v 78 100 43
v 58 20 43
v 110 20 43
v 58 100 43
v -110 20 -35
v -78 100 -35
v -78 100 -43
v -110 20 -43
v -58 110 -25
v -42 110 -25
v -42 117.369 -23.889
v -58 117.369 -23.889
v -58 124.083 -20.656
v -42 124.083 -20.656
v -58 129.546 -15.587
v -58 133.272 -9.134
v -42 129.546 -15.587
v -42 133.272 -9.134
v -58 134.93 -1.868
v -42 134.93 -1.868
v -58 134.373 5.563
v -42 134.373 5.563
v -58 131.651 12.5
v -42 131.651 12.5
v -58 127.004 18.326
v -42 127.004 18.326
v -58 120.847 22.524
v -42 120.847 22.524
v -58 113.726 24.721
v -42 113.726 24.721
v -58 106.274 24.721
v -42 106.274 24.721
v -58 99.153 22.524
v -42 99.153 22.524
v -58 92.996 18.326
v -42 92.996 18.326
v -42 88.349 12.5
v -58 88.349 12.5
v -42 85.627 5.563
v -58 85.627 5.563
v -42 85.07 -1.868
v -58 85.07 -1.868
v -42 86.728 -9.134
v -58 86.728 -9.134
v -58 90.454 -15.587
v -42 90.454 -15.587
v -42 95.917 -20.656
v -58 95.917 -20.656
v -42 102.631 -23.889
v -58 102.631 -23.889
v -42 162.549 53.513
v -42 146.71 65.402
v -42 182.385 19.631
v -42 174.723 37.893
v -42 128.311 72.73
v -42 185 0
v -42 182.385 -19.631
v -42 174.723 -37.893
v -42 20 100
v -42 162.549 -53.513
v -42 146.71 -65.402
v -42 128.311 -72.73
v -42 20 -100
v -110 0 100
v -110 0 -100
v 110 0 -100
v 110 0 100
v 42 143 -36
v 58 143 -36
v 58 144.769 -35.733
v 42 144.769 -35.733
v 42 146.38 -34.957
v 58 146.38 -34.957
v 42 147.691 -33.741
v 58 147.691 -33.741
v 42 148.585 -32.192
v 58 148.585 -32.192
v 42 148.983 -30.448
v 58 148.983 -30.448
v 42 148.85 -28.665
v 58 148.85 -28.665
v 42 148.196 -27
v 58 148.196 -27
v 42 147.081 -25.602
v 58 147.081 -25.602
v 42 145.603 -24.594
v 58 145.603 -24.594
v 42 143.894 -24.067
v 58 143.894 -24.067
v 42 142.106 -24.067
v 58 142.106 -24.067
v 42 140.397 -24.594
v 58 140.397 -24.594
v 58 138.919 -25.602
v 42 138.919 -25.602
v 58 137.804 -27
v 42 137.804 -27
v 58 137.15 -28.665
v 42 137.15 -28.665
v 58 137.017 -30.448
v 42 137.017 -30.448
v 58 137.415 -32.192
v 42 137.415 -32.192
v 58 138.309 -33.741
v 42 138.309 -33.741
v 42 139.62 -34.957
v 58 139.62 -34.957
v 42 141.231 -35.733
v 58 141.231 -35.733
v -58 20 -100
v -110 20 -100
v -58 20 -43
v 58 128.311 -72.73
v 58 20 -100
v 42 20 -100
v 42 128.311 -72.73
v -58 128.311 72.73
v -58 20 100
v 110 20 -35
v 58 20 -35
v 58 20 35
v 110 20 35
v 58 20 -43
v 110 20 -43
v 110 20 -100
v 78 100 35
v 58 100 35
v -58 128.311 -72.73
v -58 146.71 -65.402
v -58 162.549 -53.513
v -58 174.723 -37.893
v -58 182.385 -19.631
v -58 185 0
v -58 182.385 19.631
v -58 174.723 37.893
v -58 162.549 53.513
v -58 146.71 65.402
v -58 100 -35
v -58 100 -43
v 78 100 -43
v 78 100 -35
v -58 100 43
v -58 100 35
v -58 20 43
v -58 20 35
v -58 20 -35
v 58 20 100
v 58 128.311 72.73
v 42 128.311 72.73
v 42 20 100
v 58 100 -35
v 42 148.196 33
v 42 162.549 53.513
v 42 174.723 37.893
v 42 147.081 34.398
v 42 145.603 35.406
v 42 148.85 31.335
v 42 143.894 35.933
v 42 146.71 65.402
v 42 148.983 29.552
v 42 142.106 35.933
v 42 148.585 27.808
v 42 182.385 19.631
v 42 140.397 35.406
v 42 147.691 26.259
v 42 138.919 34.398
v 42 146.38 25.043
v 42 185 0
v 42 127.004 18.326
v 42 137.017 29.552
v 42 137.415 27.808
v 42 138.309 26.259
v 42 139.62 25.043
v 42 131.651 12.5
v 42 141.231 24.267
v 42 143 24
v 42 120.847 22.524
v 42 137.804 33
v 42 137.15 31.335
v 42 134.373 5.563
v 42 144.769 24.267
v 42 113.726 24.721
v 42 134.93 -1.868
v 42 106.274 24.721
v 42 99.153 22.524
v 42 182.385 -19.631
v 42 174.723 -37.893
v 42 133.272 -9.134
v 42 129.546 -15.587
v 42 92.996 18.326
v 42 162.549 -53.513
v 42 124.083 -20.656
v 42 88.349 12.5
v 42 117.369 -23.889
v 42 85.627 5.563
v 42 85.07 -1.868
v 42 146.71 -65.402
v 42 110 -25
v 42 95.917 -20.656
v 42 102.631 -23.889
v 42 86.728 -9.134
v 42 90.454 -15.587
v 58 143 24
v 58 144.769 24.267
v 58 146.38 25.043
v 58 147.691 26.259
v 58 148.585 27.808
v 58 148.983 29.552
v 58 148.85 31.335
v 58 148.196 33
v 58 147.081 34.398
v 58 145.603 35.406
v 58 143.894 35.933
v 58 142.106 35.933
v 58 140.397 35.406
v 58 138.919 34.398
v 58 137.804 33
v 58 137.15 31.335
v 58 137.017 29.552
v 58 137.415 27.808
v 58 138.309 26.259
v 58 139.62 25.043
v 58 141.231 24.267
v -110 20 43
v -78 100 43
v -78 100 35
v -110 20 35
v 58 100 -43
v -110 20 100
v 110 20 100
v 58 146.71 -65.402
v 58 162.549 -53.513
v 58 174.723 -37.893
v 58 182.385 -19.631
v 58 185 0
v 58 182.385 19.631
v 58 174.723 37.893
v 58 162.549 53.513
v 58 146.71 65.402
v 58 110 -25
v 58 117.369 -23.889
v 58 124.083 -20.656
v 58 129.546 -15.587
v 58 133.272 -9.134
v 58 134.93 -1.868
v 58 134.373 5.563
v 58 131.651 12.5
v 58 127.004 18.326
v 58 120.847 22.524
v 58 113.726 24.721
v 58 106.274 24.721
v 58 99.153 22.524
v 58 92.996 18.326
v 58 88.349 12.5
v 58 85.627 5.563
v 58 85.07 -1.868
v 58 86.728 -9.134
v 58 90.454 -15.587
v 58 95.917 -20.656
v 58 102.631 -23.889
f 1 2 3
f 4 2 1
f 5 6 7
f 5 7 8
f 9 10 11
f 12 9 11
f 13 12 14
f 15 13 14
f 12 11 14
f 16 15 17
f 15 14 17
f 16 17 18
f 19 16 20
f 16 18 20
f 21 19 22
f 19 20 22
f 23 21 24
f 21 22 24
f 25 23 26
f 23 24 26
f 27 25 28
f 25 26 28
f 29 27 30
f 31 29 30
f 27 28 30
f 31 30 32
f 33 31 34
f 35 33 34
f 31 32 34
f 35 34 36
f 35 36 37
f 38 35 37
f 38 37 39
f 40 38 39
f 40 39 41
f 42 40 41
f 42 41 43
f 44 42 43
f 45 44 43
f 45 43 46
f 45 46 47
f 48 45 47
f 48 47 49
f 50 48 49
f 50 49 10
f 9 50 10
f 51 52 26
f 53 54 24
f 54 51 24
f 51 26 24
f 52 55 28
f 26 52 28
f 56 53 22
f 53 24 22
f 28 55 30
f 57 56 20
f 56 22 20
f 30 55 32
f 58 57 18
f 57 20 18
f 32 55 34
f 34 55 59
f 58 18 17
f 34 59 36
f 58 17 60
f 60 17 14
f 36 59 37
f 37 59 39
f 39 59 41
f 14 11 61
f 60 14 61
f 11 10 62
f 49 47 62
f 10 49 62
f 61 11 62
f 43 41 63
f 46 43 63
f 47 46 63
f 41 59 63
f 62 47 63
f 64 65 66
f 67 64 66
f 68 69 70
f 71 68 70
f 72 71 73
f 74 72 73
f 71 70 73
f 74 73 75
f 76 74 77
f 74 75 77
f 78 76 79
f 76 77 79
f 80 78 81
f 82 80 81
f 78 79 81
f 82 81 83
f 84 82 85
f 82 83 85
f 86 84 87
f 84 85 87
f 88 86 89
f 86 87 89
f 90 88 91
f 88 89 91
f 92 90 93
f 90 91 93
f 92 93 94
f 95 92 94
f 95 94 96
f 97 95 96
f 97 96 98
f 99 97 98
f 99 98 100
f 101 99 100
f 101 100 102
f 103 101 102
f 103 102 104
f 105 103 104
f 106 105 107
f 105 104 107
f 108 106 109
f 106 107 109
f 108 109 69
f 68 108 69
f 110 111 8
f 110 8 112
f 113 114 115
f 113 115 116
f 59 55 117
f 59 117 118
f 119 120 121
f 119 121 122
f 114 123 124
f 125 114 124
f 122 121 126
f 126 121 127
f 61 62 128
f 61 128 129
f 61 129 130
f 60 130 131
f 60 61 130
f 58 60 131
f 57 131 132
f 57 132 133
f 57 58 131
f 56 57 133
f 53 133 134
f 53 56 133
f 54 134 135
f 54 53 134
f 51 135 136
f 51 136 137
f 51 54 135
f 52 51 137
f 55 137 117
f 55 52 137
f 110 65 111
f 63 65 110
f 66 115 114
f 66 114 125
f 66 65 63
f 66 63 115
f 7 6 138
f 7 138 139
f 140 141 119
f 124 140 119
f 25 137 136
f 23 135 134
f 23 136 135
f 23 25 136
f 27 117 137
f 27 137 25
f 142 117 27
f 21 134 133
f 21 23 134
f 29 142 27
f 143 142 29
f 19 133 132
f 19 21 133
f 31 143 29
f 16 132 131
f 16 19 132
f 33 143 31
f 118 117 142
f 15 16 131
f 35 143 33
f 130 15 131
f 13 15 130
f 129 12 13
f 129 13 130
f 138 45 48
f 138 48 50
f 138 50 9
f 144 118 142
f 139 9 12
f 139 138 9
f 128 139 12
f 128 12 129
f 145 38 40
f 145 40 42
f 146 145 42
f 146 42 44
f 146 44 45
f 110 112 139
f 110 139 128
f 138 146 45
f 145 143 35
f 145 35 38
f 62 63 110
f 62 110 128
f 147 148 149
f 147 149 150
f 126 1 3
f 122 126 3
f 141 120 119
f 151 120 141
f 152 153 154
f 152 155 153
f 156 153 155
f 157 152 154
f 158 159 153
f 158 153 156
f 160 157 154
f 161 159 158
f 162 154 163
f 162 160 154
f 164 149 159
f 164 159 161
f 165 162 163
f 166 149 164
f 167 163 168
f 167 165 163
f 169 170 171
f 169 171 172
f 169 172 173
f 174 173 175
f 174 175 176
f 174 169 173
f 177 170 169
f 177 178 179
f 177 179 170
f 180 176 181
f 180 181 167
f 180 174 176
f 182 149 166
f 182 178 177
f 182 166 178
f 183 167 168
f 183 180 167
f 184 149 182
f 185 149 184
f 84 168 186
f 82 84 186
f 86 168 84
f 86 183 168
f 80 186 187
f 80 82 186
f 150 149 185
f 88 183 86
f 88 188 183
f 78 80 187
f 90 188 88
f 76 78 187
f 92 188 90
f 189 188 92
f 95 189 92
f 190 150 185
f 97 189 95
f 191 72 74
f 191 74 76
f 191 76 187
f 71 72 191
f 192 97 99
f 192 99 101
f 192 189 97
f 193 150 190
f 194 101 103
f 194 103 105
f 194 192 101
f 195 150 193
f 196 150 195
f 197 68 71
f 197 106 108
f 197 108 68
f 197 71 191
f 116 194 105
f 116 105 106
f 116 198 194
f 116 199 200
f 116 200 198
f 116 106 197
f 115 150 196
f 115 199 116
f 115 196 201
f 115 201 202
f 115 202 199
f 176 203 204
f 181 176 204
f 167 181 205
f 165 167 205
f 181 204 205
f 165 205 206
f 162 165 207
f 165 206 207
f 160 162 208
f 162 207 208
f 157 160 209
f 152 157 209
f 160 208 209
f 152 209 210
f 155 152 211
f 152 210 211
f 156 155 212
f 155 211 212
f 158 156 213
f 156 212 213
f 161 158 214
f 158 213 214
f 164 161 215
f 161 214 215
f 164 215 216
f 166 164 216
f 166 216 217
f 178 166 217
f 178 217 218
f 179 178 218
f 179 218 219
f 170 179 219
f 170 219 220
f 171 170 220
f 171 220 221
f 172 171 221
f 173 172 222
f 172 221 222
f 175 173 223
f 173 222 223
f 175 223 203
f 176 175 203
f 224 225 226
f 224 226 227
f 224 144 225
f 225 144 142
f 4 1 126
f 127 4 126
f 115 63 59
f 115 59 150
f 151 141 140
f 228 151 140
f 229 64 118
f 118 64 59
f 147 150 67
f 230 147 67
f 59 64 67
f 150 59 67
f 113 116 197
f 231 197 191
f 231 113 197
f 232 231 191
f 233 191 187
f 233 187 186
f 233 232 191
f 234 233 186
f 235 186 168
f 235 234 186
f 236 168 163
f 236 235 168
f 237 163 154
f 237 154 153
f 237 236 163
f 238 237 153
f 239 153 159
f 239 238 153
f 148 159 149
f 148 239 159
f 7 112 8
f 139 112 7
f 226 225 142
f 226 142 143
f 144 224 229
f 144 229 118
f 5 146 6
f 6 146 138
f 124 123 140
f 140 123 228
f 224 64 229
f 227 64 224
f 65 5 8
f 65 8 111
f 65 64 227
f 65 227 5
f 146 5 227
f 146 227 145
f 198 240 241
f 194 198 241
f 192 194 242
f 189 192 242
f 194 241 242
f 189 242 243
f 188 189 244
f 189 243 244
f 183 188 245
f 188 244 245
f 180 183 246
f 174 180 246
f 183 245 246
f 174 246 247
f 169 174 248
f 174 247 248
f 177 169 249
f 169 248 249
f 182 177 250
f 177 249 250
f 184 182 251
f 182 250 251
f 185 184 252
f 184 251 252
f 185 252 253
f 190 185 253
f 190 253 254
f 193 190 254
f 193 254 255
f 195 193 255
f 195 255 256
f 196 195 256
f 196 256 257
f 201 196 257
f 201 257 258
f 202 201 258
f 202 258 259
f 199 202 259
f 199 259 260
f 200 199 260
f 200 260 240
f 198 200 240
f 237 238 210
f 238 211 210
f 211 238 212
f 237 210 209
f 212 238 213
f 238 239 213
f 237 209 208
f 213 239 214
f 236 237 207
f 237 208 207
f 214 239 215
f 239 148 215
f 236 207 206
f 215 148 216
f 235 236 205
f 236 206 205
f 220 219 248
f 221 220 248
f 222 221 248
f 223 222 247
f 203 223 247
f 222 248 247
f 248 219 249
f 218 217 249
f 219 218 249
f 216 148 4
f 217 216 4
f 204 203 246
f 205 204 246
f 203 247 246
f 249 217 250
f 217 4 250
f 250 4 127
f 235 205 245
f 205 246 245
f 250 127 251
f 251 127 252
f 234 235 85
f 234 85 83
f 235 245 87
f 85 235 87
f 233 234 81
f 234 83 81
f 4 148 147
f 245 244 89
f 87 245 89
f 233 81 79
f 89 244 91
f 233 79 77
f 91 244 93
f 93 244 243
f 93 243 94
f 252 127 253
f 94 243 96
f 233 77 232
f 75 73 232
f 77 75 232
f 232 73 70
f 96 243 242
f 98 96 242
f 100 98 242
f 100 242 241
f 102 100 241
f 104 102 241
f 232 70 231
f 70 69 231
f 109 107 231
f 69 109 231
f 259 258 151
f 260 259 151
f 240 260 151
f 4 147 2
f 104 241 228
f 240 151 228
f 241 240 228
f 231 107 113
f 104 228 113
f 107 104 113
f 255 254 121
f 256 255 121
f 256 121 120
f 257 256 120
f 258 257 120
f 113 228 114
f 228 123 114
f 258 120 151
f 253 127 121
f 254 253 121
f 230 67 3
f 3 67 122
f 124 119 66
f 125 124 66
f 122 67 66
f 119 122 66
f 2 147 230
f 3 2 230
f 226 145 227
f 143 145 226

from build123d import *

# Parameters (mm, degrees)
SKETCH_1_W          = 220
SKETCH_1_H          = 200
EXTRUDE_1_DEPTH     = 20
SKETCH_2_W          = 16
SKETCH_2_H          = 200
EXTRUDE_2_DEPTH     = 200
SKETCH_3_R          = 25
CUT_EXTRUDE_1_DEPTH = 295.319554226
SKETCH_4_W          = 8
SKETCH_4_H          = 80
EXTRUDE_3_DEPTH     = 52
CUT_EXTRUDE_2_DEPTH = 259.406656261
SKETCH_6_R          = 6
CUT_EXTRUDE_3_DEPTH = 16


with BuildPart() as part:
    # 草图1 → 凸台-拉伸1 (new body)
    with BuildSketch(Plane(origin=(0, 0, 0), x_dir=(1, 0, 0), z_dir=(0, 1, 0))):
        Rectangle(SKETCH_1_W, SKETCH_1_H)
    extrude(amount=EXTRUDE_1_DEPTH)

    # 草图2 → 凸台-拉伸2 (add)
    with BuildSketch(Plane(origin=(0, 20, 0), x_dir=(1, 0, 0), z_dir=(0, 1, 0))):
        with Locations((-50, 0)):
            Rectangle(SKETCH_2_W, SKETCH_2_H)
        with Locations((50, 0)):
            Rectangle(SKETCH_2_W, SKETCH_2_H)
    extrude(amount=EXTRUDE_2_DEPTH)

    # 草图3 → 切除-拉伸1 (cut, through all)
    with BuildSketch(Plane(origin=(58, 0, 0), x_dir=(0, 0, -1), z_dir=(1, 0, 0))):
        with Locations((0, 110)):
            Circle(SKETCH_3_R)
        with BuildLine():
            Line((-72.730270262, 128.311411403), (-100, 20))
            Line((-100, 20), (-100, 220))
            Line((-100, 220), (100, 220))
            Line((100, 220), (100, 20))
            Line((100, 20), (72.730270262, 128.311411403))
            ThreePointArc((72.730270262, 128.311411403), (0, 185), (-72.730270262, 128.311411403))
        make_face()
    extrude(amount=-CUT_EXTRUDE_1_DEPTH, mode=Mode.SUBTRACT)

    # 草图4 → 凸台-拉伸3 (add)
    with BuildSketch(Plane(origin=(58, 0, 0), x_dir=(0, 0, -1), z_dir=(1, 0, 0))):
        with Locations((-39, 60)):
            Rectangle(SKETCH_4_W, SKETCH_4_H)
        with Locations((39, 60)):
            Rectangle(SKETCH_4_W, SKETCH_4_H)
    extrude_3 = extrude(amount=EXTRUDE_3_DEPTH)

    # 草图5 → 切除-拉伸2 (cut, through all)
    with BuildSketch(Plane.XY.offset(43)):
        Polygon((110, 100), (78, 100), (110, 20), align=None)
    cut_extrude_2 = extrude(amount=-CUT_EXTRUDE_2_DEPTH, mode=Mode.SUBTRACT)

    # 镜向1: 凸台-拉伸3, 切除-拉伸2 across plane
    add(extrude_3.mirror(Plane(origin=(0, 0, 0), x_dir=(0, 0, 1), z_dir=(1, 0, 0))))
    add(cut_extrude_2.mirror(Plane(origin=(0, 0, 0), x_dir=(0, 0, 1), z_dir=(1, 0, 0))), mode=Mode.SUBTRACT)

    # 草图6 → 切除-拉伸3 (cut)
    with BuildSketch(Plane(origin=(58, 0, 0), x_dir=(0, 0, -1), z_dir=(1, 0, 0))):
        with Locations((-30, 143)):
            Circle(SKETCH_6_R)
        with Locations((30, 143)):
            Circle(SKETCH_6_R)
    extrude(amount=-CUT_EXTRUDE_3_DEPTH, mode=Mode.SUBTRACT)


solid = part.part
